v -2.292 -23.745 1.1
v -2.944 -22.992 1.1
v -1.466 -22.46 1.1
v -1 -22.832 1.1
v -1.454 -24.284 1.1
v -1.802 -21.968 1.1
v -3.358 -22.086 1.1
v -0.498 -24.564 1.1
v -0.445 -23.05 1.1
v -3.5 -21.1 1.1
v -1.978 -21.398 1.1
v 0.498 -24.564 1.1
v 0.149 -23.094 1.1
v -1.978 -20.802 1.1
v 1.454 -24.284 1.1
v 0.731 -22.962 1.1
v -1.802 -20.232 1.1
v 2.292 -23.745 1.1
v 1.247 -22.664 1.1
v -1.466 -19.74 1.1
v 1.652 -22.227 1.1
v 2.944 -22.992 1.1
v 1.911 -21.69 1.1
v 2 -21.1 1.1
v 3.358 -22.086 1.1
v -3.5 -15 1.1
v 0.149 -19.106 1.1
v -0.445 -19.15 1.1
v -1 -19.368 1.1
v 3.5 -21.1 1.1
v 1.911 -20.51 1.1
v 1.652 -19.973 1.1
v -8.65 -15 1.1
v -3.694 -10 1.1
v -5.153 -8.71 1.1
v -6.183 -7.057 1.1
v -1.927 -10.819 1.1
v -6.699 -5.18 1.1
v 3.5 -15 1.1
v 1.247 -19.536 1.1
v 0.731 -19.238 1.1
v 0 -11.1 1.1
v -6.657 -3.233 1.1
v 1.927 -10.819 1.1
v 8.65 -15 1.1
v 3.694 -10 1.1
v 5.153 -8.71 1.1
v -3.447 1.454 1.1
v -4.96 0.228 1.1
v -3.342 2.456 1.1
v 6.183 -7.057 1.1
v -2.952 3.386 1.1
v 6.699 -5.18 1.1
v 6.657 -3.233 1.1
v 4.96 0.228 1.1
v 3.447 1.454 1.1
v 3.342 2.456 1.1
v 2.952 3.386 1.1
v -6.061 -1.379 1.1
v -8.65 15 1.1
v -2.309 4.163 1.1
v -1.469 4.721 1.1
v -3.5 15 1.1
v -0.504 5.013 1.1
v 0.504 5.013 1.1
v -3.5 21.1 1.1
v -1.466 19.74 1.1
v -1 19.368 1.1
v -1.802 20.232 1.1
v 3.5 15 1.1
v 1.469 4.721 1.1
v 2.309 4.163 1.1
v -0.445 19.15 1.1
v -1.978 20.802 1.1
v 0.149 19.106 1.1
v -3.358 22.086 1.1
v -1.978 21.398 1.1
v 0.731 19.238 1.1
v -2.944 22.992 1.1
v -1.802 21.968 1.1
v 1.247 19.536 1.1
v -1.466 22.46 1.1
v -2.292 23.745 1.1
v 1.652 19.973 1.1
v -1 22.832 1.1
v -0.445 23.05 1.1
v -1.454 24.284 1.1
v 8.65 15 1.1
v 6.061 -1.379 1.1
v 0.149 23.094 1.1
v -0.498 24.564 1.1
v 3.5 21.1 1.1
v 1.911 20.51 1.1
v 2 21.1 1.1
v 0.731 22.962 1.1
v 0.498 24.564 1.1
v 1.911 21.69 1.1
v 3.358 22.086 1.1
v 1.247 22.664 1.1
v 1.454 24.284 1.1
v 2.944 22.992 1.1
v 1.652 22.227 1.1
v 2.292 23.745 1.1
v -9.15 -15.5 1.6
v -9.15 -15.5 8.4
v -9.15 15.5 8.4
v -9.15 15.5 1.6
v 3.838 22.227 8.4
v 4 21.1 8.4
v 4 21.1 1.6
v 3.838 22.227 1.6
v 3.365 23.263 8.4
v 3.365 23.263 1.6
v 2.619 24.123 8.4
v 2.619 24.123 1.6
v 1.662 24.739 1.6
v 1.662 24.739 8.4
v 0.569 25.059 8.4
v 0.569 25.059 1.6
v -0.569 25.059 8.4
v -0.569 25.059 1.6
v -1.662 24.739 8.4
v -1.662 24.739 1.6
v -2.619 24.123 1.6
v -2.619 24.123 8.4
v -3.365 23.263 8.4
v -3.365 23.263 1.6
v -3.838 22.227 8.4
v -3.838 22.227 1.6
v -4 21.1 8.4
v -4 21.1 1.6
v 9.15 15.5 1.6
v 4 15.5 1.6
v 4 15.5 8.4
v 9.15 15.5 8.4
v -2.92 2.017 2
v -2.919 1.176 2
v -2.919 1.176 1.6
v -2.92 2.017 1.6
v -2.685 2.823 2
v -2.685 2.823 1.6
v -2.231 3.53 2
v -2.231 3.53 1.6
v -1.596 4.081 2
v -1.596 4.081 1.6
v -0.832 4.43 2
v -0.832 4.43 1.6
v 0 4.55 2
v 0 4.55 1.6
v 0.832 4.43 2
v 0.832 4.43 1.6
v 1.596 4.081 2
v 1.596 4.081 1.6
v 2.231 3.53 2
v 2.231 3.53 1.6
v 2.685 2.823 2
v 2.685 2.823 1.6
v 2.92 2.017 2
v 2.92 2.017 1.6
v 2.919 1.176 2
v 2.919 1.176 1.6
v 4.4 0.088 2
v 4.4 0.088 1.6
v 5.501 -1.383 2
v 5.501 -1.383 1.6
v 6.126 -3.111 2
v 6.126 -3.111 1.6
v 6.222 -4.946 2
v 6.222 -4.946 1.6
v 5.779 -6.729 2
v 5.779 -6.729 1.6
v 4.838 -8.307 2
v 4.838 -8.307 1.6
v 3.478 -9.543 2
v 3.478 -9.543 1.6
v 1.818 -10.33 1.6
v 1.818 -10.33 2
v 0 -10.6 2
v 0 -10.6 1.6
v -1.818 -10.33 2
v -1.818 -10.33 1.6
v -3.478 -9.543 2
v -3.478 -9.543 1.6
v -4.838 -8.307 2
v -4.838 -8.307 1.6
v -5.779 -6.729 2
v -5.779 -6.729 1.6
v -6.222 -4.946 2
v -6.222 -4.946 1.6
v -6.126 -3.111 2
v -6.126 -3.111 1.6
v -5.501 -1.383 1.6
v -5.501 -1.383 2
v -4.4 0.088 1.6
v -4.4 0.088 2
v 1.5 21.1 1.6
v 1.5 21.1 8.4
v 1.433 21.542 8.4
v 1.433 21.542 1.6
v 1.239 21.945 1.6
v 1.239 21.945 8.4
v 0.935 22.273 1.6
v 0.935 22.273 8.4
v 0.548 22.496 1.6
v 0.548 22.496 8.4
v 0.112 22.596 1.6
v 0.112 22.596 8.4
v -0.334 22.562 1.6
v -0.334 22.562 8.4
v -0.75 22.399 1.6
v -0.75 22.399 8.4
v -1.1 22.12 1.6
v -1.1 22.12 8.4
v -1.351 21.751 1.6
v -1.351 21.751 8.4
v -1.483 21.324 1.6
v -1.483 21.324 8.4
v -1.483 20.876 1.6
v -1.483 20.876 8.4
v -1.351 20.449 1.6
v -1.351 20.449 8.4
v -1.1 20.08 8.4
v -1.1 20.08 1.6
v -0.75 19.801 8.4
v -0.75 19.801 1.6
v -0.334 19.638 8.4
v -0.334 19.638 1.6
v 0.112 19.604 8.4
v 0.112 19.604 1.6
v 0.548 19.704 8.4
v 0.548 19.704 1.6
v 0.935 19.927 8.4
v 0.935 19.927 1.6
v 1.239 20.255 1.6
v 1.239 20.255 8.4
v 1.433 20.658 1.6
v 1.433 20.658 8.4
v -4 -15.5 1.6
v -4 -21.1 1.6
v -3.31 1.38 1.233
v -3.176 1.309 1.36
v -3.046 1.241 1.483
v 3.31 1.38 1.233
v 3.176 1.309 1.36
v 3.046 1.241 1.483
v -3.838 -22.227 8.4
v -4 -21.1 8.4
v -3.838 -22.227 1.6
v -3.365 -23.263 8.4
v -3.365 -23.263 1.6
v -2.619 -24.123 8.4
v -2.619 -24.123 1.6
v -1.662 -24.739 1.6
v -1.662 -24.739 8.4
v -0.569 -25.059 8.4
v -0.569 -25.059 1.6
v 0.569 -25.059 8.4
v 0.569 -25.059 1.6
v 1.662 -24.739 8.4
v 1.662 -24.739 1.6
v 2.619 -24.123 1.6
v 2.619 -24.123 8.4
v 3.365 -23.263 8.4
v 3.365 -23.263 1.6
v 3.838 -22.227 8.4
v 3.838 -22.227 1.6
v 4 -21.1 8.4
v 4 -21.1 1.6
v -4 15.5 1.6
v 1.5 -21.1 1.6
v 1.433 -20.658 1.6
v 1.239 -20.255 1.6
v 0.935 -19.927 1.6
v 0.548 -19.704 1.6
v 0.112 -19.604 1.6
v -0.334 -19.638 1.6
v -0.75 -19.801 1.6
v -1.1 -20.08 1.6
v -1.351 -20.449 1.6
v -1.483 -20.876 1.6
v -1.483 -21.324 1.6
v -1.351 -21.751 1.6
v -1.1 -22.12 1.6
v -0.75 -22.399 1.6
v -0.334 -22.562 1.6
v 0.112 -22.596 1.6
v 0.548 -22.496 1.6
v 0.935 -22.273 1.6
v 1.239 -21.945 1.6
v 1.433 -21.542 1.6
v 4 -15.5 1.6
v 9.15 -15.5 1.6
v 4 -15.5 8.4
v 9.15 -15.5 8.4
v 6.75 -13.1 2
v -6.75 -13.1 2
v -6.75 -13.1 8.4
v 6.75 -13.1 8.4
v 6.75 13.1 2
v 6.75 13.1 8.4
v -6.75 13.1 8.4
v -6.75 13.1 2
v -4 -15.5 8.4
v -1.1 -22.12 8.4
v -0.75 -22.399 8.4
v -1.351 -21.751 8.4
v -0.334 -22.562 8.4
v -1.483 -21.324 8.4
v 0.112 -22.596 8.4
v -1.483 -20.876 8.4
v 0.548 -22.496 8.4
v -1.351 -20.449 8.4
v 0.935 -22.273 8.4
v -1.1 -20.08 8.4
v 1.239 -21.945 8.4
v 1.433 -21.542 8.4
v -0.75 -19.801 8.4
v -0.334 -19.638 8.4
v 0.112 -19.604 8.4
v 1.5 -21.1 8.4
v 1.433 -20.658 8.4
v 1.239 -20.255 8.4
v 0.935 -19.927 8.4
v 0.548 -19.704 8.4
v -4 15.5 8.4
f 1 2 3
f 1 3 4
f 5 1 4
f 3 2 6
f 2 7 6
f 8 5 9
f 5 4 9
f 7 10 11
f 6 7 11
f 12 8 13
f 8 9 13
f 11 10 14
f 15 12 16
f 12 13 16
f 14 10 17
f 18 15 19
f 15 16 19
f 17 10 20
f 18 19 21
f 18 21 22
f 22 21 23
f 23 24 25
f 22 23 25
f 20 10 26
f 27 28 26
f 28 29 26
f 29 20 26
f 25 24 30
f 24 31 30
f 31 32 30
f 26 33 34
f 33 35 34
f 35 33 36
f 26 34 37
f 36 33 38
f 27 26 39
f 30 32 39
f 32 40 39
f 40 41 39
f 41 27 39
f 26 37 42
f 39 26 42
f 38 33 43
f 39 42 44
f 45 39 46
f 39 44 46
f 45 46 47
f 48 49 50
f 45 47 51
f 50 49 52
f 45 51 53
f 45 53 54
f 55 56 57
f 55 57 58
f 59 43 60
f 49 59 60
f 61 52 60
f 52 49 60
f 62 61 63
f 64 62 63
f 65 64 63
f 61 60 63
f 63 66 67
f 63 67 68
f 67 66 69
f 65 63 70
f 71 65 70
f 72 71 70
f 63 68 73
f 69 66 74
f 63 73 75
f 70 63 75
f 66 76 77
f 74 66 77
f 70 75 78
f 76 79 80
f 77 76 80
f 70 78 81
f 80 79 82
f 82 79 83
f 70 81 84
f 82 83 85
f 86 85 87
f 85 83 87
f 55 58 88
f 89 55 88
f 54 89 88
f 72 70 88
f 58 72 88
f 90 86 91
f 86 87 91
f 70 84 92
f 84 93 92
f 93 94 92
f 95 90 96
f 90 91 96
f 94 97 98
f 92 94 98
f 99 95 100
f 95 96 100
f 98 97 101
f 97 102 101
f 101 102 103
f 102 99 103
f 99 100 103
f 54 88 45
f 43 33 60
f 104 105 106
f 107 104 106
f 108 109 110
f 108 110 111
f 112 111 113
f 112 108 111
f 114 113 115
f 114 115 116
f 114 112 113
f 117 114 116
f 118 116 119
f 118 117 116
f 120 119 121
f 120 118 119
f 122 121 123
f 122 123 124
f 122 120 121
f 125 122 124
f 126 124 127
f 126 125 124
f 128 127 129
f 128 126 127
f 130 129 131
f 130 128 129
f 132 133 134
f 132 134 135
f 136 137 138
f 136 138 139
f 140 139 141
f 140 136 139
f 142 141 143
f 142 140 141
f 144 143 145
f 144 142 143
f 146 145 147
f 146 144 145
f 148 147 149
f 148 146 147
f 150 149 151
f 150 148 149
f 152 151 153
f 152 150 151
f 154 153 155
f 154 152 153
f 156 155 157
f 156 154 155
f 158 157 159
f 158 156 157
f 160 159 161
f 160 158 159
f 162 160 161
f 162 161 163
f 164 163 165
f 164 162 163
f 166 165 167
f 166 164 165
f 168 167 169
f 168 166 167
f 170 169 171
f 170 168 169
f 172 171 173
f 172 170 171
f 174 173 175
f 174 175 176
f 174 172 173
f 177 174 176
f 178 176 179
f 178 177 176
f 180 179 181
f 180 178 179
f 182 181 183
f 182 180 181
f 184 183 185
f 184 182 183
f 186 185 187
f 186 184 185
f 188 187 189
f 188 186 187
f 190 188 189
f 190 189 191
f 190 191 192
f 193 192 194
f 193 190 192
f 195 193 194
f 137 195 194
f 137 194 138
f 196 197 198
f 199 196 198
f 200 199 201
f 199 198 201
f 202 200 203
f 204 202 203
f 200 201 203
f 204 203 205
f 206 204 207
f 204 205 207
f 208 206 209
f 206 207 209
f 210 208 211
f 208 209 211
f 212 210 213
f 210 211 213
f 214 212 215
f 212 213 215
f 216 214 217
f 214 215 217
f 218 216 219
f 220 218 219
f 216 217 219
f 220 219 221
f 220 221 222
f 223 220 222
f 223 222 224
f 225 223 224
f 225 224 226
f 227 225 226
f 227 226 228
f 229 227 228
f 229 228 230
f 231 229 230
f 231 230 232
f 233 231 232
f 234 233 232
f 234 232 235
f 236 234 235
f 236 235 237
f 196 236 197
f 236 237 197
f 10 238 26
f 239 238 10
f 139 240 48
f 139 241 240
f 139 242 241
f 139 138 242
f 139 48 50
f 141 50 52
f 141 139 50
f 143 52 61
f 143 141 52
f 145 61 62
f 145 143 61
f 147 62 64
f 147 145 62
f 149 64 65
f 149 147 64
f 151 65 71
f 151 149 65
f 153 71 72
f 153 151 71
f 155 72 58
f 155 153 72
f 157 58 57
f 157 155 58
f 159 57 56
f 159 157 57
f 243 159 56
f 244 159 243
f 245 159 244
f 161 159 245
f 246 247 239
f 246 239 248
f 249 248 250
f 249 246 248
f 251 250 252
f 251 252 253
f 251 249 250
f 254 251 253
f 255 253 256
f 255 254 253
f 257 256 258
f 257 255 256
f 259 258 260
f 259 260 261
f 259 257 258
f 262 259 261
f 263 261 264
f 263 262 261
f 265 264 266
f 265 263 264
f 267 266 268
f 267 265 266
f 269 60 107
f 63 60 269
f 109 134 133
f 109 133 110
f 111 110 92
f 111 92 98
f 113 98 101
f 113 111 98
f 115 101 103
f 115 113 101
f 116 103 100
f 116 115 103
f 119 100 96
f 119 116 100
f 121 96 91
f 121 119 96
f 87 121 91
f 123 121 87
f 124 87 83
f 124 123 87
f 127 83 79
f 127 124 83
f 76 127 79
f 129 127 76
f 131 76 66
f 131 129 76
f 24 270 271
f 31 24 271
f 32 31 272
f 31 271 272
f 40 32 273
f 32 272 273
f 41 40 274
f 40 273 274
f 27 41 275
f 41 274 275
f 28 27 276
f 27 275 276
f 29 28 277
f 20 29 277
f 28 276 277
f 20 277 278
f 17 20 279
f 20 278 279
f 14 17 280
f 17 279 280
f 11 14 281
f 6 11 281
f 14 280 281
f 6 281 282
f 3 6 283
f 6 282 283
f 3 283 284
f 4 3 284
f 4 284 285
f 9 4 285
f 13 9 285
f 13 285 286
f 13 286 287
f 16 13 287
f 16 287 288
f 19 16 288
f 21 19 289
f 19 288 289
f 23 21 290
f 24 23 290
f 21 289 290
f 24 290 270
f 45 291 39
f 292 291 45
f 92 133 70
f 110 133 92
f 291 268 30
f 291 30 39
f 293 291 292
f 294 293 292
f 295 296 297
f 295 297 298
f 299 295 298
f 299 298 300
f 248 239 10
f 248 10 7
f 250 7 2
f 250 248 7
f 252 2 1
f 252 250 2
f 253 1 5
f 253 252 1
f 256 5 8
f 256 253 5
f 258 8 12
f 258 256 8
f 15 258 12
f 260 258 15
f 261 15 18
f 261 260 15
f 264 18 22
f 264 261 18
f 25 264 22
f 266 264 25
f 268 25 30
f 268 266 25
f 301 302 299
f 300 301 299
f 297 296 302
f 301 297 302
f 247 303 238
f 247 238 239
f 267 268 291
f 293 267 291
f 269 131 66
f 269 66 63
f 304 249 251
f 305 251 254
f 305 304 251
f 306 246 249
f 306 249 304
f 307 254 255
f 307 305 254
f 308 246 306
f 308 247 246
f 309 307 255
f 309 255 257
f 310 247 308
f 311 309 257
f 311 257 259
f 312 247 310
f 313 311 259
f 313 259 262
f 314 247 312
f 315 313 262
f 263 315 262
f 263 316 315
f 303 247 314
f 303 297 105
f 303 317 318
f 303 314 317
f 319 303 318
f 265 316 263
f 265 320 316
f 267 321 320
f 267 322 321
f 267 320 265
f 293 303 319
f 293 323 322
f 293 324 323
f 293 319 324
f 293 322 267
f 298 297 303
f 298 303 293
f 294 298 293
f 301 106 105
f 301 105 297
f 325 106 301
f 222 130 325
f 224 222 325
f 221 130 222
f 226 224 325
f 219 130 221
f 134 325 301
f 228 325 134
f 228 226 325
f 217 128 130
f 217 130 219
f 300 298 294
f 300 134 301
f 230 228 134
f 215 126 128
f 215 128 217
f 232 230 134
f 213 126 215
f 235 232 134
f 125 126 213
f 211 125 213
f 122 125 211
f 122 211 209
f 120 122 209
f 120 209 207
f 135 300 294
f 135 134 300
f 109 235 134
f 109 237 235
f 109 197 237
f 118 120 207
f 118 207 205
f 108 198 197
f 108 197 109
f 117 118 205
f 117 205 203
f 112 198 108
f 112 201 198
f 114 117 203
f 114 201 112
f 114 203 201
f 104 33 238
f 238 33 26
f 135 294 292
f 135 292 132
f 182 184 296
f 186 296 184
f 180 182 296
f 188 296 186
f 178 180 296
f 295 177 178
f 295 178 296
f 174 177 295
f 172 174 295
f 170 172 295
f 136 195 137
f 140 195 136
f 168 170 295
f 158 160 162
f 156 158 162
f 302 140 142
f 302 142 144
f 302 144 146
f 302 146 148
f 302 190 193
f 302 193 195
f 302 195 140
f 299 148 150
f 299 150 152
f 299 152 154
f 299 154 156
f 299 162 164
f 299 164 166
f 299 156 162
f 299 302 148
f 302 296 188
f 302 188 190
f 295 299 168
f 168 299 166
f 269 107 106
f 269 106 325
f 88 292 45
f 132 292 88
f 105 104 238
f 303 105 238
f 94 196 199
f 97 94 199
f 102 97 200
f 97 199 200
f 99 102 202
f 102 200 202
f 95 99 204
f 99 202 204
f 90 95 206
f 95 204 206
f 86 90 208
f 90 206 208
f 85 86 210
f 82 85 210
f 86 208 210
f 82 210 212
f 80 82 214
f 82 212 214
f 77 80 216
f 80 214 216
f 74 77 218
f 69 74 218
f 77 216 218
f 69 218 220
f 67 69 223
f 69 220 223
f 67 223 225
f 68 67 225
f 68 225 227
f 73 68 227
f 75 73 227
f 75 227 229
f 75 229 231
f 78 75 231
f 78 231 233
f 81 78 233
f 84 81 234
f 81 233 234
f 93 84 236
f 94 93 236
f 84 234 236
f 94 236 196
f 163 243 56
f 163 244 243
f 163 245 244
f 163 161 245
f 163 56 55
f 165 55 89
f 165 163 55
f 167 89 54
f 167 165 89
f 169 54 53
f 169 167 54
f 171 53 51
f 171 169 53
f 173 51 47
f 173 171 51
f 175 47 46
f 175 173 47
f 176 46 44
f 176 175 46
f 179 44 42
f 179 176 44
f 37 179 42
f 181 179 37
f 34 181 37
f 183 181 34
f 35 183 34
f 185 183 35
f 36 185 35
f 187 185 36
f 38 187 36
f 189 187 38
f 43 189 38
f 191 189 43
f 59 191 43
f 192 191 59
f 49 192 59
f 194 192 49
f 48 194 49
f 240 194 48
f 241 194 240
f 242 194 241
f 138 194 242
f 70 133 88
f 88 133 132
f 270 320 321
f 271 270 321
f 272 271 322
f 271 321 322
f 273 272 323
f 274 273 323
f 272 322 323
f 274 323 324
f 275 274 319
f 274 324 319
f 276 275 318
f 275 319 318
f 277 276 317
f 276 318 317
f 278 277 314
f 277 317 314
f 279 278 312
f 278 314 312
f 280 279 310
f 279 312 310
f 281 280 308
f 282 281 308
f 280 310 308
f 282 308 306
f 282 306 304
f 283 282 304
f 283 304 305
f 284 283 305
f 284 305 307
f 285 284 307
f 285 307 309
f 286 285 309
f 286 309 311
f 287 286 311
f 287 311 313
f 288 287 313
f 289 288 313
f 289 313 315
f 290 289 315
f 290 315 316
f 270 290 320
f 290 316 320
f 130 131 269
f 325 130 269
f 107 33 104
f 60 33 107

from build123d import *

# Parameters (mm, degrees)
F0_W      = 13.5
F0_H      = 26.2
F1_DEPTH  = 2
F2_W      = 18.3
F2_H      = 31
F2_W_2    = 13.5
F2_H_2    = 26.2
F3_DEPTH  = 8.4
F4_R      = 1.5
F5_DEPTH  = 8.4
F6_DEPTH  = 2.4
F7_DEPTH  = 2
F8_DEPTH  = 2
F9_DEPTH  = 1
F10_DEPTH = 0.5
F11_SIZE  = 0.5


with BuildPart() as f1:
    # F0 (on Top) → F1 (new body)
    with BuildSketch(Plane.XY):
        Rectangle(F0_W, F0_H)
        with BuildLine():
            ThreePointArc((2.919408303, 1.1762605042), (0, -10.6), (-2.919408303, 1.1762605042))
            ThreePointArc((-2.919408303, 1.1762605042), (0, 4.55), (2.919408303, 1.1762605042))
        make_face(mode=Mode.SUBTRACT)
    extrude(amount=F1_DEPTH)

    # F2 (on Top) → F3 (join)
    with BuildSketch(Plane.XY):
        Rectangle(F2_W, F2_H)
        Rectangle(F2_W_2, F2_H_2, mode=Mode.SUBTRACT)
    extrude(amount=F3_DEPTH)

    # F4 (on Top) → F5 (join, through all)
    with BuildSketch(Plane.XY):
        with BuildLine():
            Line((-4, 21.1), (-4, 15.5))
            Line((-4, 15.5), (4, 15.5))
            Line((4, 15.5), (4, 21.1))
            ThreePointArc((4, 21.1), (0, 25.1), (-4, 21.1))
        make_face()
        with Locations((0, 21.1)):
            Circle(F4_R, mode=Mode.SUBTRACT)
        with BuildLine():
            Line((4, -21.1), (4, -15.5))
            Line((4, -15.5), (-4, -15.5))
            Line((-4, -15.5), (-4, -21.1))
            ThreePointArc((-4, -21.1), (0, -25.1), (4, -21.1))
        make_face()
        with Locations((0, -21.1)):
            Circle(F4_R, mode=Mode.SUBTRACT)
    extrude(amount=F5_DEPTH)

    # F6 (add): a face of the model
    f6_faces = [f1.faces().sort_by_distance(p)[0] for p in [
        (0, -11.1343154499, 0),
    ]]
    extrude(f6_faces, amount=F6_DEPTH)

    # F7 (cut): a face of the model
    f7_faces = [f1.faces().sort_by_distance(p)[0] for p in [
        (0, -11.1343154499, -2.4),
    ]]
    extrude(f7_faces, amount=-F7_DEPTH, mode=Mode.SUBTRACT)

    # F8 (cut): a face of the model
    f8_faces = [f1.faces().sort_by_distance(p)[0] for p in [
        (0, -11.1343154499, -0.4),
    ]]
    extrude(f8_faces, amount=-F8_DEPTH, mode=Mode.SUBTRACT)

    # F9 (add): a face of the model
    f9_faces = [f1.faces().sort_by_distance(p)[0] for p in [
        (0, -11.1343154499, 1.6),
    ]]
    extrude(f9_faces, amount=F9_DEPTH)

    # F10 (cut): a face of the model
    f10_faces = [f1.faces().sort_by_distance(p)[0] for p in [
        (0, -11.1343154499, 0.6),
    ]]
    extrude(f10_faces, amount=-F10_DEPTH, mode=Mode.SUBTRACT)

    # F11
    f11_edges = [f1.edges().sort_by_distance(p)[0] for p in [
        (0, -10.6, 1.1),
        (0, 4.55, 1.1),
        (9.15, 0, 1.1),
        (6.575, 15.5, 1.1),
        (4, 18.3, 1.1),
        (0, 25.1, 1.1),
        (-4, 18.3, 1.1),
        (-6.575, 15.5, 1.1),
        (-9.15, 0, 1.1),
        (-6.575, -15.5, 1.1),
        (-4, -18.3, 1.1),
        (0, -25.1, 1.1),
        (4, -18.3, 1.1),
        (6.575, -15.5, 1.1),
        (-1.5, 21.1, 1.1),
        (-1.5, -21.1, 1.1),
    ]]
    chamfer(f11_edges, length=F11_SIZE)


solid = f1.part
